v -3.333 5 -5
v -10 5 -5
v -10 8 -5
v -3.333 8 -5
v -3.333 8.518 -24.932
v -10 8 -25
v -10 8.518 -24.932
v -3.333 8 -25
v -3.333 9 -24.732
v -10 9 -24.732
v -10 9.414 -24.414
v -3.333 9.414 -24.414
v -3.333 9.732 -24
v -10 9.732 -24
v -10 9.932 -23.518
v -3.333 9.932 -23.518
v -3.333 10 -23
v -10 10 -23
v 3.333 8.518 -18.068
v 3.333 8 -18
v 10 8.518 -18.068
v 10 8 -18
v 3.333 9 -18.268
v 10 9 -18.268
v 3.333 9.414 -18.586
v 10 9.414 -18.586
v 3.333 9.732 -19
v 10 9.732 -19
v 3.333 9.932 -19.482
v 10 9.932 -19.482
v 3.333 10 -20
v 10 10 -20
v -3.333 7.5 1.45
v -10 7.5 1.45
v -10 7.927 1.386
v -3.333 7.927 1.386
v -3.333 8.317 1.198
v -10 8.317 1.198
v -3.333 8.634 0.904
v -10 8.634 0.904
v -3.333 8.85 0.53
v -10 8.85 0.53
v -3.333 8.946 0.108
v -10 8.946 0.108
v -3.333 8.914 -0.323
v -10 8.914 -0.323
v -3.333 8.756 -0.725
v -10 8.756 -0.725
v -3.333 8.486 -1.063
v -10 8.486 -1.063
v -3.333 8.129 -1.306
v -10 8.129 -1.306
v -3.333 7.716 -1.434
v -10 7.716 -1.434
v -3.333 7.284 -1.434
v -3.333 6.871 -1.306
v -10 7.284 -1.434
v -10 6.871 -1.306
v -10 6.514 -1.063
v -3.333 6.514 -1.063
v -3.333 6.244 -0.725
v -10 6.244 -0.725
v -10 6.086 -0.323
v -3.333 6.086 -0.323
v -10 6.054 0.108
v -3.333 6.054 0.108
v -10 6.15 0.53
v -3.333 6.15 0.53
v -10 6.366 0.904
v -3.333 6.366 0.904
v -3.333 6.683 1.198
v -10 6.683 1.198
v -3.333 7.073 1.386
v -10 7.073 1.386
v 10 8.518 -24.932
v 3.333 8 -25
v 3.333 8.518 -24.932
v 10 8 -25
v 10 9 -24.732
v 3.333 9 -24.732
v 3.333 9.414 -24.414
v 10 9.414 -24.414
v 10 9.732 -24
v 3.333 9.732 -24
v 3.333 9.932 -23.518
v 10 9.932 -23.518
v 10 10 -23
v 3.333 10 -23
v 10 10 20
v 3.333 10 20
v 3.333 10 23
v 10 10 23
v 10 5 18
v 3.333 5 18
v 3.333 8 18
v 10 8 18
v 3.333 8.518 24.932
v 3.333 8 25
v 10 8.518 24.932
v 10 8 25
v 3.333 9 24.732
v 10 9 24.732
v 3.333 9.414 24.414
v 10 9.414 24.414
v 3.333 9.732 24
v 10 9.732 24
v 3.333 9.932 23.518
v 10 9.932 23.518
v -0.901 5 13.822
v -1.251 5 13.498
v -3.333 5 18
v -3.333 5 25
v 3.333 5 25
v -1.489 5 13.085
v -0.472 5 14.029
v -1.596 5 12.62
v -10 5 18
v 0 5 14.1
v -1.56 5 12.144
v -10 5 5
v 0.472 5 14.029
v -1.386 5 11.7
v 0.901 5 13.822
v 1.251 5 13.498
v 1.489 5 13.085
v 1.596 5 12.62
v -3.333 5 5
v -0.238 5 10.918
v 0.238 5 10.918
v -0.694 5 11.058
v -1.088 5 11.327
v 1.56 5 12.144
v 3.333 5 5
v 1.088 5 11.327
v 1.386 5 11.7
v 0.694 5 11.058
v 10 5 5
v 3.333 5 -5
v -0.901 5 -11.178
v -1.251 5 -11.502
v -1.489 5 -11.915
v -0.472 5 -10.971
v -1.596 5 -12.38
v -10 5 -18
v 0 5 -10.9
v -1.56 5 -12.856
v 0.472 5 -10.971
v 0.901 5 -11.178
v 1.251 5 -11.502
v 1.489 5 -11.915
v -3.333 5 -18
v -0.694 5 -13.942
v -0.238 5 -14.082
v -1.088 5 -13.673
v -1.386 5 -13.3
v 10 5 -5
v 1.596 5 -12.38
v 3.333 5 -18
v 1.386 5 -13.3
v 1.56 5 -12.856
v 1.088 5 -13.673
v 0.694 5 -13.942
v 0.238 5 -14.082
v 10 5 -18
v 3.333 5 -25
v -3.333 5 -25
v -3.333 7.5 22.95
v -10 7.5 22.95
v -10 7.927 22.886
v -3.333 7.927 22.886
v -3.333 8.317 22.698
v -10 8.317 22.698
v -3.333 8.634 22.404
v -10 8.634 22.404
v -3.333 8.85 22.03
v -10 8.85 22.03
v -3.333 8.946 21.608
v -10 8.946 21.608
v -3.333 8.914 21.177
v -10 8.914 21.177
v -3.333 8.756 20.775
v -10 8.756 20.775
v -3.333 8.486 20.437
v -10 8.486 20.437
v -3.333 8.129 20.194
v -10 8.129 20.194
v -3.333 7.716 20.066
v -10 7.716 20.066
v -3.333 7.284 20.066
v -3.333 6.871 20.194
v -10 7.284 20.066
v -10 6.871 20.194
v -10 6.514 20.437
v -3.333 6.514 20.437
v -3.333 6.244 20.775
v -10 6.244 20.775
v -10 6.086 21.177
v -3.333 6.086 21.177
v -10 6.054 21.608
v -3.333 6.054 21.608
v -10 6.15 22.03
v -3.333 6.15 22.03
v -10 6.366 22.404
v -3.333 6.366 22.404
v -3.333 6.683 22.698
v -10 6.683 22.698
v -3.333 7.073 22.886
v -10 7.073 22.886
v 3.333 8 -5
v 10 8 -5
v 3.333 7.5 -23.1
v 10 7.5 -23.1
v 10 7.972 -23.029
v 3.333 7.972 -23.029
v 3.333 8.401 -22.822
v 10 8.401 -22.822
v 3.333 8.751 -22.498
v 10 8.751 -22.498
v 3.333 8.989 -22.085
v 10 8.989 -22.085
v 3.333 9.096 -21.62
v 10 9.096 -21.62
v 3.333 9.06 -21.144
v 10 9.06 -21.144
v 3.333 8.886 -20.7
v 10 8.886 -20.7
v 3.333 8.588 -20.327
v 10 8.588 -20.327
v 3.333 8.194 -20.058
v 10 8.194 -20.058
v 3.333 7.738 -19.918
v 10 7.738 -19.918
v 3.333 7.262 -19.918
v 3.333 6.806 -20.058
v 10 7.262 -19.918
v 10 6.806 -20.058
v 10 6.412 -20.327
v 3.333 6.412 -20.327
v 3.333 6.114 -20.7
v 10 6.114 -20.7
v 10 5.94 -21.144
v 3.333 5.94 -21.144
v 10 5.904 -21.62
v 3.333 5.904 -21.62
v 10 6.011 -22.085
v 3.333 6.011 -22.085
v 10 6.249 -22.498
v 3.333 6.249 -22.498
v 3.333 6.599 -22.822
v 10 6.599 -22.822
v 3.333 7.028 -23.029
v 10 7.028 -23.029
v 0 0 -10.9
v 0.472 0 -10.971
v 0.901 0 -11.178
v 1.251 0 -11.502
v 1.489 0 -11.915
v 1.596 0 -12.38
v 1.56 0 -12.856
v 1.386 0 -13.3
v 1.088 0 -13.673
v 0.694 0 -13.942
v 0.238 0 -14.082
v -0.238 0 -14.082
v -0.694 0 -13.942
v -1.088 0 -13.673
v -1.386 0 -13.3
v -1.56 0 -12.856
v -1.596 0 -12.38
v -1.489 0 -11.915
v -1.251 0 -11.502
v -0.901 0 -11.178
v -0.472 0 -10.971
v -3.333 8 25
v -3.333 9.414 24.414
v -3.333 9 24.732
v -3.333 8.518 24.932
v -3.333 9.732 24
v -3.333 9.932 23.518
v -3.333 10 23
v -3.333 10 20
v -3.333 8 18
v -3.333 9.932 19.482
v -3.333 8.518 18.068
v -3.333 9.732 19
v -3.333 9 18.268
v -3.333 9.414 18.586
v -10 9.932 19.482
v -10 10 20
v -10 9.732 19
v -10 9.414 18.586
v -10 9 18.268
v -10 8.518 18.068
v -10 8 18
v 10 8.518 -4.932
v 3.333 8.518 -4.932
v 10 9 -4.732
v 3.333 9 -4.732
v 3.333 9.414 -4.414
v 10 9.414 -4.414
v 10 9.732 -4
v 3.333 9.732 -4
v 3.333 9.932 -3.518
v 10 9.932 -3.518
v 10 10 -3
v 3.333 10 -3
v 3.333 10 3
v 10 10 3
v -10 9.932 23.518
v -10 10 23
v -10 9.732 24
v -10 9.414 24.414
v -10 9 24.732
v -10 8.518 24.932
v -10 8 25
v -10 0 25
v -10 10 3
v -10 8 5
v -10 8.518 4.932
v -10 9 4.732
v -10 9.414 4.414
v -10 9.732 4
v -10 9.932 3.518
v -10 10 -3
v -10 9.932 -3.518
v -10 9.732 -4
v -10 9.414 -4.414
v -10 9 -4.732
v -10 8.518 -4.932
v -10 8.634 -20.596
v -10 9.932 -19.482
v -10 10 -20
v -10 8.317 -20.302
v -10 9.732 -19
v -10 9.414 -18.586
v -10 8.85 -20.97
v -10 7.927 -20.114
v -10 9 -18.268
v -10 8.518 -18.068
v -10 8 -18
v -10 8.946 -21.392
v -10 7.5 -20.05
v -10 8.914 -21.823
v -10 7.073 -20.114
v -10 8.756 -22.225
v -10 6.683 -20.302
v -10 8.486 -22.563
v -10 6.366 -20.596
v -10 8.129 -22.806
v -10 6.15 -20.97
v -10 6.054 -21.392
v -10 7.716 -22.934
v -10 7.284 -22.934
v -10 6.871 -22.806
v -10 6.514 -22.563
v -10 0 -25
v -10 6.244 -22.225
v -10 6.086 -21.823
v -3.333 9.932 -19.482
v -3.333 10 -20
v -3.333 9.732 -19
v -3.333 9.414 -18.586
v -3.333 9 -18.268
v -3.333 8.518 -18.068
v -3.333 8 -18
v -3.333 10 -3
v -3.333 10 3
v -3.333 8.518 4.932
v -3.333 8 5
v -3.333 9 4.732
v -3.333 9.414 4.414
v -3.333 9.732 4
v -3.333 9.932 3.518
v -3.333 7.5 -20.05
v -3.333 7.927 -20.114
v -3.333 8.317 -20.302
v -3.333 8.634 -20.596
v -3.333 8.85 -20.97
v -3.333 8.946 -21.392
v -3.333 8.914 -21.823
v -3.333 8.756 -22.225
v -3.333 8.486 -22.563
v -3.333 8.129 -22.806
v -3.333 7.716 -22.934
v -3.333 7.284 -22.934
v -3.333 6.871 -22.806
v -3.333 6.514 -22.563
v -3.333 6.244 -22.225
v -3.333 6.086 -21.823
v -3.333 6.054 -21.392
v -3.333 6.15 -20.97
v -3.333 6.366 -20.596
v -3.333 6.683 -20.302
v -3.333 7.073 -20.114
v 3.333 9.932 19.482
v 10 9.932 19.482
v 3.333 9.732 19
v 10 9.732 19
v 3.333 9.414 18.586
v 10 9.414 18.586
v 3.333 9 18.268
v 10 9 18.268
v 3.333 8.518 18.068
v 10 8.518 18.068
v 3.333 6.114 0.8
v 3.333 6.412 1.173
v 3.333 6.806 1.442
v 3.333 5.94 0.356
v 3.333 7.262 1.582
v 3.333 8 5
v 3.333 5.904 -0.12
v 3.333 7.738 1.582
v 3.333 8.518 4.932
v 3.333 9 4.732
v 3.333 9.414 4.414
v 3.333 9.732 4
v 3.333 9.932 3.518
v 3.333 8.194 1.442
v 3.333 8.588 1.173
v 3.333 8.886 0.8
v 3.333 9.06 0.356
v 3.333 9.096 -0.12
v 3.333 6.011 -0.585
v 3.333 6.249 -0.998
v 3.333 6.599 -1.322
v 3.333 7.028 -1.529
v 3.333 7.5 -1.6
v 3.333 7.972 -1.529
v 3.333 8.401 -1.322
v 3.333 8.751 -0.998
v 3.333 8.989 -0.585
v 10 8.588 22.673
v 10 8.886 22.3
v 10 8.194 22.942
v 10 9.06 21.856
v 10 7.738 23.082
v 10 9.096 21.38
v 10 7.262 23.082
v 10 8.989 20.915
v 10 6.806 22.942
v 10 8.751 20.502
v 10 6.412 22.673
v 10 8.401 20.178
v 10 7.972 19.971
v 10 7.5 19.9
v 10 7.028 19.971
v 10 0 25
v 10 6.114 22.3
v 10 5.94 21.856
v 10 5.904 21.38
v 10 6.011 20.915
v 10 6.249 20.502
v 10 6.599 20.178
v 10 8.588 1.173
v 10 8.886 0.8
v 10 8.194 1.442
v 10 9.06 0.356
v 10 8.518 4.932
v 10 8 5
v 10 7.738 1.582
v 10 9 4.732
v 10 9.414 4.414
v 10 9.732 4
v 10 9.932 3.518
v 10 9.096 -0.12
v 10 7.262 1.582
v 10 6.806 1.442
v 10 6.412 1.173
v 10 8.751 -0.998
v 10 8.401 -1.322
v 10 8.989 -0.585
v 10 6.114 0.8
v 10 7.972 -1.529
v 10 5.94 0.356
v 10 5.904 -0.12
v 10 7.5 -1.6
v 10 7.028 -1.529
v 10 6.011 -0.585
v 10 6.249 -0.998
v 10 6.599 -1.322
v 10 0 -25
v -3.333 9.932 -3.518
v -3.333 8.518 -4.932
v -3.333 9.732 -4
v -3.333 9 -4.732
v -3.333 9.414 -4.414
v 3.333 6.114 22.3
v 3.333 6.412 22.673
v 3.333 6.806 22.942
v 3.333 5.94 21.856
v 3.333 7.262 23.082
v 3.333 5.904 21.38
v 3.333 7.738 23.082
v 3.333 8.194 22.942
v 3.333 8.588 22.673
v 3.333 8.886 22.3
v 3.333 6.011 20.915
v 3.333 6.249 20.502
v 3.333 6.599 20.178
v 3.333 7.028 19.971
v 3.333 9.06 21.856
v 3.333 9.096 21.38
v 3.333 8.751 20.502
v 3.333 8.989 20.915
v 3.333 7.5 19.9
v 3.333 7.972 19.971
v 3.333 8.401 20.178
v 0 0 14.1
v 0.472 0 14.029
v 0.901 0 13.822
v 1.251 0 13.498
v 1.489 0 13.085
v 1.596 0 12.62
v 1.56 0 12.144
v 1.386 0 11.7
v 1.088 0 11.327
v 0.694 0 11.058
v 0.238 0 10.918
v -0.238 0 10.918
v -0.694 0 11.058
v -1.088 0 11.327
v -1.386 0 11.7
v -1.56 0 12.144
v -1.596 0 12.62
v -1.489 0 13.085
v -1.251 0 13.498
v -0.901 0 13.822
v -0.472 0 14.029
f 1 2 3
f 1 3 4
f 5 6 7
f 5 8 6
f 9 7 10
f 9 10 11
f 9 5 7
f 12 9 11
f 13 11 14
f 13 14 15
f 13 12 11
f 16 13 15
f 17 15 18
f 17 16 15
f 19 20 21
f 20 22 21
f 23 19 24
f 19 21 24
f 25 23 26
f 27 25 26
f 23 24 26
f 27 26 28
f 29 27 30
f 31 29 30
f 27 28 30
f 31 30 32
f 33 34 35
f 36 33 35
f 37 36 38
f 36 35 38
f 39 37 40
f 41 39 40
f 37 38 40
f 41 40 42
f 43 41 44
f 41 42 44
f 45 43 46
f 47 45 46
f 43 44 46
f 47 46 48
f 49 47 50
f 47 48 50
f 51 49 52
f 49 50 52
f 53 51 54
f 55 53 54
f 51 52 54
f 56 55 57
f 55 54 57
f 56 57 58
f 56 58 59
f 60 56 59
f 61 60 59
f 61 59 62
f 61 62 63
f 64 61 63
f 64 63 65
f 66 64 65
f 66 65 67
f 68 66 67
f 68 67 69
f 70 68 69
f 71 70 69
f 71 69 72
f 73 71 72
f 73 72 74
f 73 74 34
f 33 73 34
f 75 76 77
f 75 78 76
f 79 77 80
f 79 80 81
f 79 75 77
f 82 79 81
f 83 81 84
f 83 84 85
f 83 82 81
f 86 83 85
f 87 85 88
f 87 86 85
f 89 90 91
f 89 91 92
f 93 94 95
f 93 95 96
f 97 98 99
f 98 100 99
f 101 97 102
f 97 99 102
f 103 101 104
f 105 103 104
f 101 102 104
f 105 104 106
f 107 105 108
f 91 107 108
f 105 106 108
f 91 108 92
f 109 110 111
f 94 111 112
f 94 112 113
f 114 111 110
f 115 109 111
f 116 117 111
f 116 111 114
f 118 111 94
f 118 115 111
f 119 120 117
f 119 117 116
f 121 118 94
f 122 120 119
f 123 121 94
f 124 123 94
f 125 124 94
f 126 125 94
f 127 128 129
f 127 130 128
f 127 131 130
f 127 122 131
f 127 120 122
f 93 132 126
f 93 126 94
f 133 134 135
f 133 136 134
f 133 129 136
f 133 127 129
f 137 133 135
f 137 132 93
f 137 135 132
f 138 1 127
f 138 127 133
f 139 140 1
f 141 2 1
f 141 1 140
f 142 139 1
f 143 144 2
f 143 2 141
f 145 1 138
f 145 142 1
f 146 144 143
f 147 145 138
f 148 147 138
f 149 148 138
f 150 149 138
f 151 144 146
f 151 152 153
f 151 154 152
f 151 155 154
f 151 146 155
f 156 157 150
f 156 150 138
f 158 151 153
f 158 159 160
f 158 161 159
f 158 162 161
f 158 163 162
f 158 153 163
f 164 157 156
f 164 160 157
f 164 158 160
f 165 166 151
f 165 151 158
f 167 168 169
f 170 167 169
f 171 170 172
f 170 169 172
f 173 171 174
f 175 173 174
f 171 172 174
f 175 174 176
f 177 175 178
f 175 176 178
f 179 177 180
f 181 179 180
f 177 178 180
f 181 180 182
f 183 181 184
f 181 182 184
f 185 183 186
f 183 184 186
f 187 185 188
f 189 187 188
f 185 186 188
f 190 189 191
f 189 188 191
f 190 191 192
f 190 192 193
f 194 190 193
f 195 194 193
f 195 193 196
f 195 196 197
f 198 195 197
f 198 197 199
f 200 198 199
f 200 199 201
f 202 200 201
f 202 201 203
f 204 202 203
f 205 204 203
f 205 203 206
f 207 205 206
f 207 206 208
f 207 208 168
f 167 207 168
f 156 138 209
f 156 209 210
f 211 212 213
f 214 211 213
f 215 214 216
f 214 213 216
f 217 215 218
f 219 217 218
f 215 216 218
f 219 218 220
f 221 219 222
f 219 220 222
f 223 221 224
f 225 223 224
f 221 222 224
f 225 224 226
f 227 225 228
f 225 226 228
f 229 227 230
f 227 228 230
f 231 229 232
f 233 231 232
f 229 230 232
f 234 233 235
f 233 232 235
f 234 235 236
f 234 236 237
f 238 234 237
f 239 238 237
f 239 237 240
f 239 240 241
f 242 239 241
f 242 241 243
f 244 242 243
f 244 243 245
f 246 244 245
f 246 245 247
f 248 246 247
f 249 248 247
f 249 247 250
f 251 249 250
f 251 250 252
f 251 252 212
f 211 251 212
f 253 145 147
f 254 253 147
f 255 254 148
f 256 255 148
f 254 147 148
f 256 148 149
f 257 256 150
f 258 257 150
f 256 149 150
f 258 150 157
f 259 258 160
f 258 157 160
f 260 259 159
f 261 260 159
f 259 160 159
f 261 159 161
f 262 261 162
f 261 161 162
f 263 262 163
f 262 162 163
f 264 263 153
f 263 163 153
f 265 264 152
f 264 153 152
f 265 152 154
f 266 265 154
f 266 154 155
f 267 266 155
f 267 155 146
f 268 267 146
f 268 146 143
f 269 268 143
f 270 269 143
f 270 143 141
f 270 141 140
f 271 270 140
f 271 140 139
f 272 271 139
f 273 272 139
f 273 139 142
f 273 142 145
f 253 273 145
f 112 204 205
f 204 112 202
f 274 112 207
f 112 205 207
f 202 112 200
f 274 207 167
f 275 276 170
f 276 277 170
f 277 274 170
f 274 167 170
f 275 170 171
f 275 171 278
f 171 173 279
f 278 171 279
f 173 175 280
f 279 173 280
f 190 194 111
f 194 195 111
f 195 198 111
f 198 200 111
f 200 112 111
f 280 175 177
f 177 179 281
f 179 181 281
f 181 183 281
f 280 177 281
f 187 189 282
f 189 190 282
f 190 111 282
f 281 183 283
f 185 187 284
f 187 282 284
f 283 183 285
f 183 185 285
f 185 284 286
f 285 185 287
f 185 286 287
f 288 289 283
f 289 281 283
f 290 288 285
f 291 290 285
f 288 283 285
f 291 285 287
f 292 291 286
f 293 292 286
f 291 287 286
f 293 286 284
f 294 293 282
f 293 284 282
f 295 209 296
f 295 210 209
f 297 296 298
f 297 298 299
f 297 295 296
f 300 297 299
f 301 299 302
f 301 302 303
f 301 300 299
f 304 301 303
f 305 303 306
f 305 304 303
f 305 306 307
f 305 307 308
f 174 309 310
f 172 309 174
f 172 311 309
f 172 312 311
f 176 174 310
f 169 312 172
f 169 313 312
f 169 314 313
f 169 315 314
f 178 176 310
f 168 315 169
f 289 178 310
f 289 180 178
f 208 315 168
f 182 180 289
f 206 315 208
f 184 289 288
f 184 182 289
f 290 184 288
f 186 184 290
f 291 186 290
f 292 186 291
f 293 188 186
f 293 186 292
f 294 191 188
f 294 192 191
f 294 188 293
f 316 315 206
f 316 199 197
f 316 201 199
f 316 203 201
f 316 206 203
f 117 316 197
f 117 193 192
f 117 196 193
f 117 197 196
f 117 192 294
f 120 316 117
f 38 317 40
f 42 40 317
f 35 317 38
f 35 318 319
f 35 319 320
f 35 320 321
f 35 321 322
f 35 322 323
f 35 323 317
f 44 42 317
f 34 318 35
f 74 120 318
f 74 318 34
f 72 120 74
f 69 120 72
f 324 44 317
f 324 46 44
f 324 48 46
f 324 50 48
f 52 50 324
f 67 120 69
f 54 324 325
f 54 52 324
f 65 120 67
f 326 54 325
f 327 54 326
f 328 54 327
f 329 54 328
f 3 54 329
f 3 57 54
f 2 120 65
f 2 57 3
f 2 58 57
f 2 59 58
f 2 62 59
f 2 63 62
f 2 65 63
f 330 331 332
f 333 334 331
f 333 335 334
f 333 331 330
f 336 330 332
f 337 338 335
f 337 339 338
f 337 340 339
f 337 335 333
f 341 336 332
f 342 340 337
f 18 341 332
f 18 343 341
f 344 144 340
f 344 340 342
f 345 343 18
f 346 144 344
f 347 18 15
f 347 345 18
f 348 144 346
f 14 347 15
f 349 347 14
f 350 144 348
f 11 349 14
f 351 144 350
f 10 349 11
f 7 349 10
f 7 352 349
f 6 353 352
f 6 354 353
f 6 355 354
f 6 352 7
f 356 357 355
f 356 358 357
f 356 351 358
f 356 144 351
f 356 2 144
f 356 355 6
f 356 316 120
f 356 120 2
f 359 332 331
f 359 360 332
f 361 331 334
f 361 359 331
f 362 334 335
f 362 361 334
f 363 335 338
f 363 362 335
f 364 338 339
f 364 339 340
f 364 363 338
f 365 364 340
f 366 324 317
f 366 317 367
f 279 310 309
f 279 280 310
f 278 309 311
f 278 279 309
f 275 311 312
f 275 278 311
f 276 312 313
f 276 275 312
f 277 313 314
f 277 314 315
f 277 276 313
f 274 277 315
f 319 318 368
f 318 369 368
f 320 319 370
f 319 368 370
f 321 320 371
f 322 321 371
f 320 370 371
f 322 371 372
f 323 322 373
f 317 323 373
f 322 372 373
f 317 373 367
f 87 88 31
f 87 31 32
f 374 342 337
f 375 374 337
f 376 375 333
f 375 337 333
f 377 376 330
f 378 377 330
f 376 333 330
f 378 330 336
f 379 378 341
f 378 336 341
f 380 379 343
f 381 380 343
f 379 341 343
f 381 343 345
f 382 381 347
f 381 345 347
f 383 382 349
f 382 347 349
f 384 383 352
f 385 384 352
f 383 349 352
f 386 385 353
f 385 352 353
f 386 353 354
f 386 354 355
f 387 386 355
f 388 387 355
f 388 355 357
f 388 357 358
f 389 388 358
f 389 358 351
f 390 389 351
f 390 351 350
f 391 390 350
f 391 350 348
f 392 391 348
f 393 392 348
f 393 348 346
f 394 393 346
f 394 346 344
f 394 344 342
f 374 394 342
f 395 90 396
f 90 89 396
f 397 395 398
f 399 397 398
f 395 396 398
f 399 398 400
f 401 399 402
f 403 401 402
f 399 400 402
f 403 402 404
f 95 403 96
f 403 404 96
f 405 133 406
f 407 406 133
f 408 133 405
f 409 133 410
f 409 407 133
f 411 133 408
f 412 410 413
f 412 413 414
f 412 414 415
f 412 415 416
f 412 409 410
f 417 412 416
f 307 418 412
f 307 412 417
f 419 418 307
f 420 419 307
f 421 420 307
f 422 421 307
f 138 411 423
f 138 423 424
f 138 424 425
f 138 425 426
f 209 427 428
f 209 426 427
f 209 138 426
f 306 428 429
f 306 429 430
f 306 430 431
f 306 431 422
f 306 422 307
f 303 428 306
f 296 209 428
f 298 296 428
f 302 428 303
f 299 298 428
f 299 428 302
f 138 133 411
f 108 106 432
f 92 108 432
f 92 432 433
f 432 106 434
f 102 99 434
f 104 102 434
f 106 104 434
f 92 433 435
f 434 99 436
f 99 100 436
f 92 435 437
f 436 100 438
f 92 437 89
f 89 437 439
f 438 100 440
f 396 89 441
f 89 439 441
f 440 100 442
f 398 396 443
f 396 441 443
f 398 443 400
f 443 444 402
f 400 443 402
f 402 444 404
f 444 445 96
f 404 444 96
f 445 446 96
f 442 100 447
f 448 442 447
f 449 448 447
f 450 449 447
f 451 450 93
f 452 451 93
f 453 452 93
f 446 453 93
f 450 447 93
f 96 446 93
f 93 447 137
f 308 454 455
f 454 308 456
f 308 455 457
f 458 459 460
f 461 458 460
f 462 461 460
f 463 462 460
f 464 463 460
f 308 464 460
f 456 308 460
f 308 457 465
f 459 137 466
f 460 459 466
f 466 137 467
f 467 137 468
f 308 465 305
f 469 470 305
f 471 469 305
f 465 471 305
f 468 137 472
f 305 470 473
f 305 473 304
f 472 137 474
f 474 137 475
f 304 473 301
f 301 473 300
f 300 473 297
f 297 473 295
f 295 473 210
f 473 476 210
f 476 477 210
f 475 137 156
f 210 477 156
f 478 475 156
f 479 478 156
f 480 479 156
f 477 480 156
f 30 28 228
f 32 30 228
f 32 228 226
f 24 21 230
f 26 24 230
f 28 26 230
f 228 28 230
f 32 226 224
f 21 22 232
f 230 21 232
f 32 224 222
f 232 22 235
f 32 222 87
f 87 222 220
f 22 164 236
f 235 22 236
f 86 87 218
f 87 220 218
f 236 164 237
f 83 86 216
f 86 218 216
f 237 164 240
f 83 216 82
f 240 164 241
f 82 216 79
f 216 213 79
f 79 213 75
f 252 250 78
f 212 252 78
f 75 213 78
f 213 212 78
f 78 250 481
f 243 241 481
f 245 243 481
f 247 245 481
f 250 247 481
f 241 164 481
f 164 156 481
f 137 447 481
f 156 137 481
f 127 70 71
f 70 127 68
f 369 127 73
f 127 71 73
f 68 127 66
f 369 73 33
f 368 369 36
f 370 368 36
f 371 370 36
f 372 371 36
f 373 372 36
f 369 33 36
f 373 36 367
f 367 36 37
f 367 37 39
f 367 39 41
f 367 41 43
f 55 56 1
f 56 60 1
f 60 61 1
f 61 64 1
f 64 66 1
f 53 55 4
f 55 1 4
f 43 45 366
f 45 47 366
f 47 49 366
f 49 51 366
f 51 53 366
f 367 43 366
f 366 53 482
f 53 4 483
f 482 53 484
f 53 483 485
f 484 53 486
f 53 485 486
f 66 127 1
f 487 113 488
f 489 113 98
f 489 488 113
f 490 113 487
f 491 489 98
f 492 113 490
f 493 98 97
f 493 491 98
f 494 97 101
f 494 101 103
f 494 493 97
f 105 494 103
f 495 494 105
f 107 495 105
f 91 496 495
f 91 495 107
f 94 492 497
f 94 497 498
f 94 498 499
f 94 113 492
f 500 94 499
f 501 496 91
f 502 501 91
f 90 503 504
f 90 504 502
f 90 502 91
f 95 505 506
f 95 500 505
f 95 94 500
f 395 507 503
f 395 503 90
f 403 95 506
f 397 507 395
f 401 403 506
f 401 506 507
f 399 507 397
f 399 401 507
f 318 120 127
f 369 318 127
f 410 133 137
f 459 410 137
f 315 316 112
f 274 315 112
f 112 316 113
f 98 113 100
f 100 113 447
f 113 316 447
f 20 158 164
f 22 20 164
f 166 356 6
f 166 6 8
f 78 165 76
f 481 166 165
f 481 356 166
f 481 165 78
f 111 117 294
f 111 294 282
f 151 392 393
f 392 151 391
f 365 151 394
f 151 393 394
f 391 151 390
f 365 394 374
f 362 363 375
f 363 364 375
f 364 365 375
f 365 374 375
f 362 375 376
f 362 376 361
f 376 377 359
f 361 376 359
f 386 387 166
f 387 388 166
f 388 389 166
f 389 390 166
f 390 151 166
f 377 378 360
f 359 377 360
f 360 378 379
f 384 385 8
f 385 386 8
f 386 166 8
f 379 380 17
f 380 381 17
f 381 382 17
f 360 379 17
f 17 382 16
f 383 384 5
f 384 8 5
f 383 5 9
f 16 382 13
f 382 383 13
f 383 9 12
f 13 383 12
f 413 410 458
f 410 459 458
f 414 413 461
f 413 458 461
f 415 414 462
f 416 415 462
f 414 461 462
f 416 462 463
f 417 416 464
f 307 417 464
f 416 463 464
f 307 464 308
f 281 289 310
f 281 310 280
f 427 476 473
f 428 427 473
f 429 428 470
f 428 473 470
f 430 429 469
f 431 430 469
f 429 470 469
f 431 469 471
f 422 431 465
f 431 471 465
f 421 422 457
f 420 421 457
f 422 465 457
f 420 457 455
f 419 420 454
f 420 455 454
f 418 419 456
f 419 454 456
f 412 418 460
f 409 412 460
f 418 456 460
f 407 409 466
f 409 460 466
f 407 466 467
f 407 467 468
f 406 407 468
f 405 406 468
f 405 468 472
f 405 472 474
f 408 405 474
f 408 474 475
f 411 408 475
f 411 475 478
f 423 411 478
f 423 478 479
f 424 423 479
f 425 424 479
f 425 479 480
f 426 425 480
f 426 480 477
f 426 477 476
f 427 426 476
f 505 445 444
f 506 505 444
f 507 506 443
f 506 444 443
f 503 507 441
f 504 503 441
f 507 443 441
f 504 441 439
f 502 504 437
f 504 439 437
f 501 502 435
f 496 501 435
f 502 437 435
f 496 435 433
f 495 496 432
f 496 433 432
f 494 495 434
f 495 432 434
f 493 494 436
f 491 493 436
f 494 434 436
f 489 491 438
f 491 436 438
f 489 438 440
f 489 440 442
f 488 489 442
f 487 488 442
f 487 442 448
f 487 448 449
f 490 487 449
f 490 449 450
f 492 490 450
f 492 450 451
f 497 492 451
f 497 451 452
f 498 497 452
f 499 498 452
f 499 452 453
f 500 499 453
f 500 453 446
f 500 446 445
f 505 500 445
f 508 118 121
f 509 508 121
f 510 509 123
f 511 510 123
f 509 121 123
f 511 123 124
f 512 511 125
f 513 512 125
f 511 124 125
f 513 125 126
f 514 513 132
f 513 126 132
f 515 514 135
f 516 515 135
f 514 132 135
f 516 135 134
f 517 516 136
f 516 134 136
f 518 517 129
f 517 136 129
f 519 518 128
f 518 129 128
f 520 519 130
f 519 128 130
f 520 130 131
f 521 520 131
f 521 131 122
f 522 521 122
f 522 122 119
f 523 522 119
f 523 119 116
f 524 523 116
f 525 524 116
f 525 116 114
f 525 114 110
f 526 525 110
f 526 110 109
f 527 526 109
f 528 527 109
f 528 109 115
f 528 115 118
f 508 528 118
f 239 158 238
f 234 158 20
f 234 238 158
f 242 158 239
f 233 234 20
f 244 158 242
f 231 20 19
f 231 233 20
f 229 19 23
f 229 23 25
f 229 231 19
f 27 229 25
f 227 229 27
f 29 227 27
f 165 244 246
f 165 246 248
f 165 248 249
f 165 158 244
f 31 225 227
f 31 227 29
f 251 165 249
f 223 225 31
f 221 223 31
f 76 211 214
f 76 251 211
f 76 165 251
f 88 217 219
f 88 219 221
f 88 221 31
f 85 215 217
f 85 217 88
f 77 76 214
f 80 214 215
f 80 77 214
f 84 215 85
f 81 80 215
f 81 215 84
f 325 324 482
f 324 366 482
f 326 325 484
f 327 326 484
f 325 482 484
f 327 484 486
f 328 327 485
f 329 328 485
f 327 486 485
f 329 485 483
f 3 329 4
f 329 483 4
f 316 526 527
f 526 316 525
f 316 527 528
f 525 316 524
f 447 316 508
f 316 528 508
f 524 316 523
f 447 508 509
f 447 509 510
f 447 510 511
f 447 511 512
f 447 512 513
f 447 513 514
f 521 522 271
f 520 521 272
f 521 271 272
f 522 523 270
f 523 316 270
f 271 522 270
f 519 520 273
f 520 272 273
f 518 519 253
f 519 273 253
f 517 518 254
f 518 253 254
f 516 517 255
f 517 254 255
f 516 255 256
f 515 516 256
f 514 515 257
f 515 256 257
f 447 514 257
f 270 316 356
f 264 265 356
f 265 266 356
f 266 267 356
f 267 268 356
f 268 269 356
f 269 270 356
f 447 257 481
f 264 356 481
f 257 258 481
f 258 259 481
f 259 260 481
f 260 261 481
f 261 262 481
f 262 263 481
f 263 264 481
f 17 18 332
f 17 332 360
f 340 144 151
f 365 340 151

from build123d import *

# Parameters (mm, degrees)
SKETCH1_W           = 20
SKETCH1_H           = 50
BOSS_EXTRUDE1_DEPTH = 5
SKETCH2_R           = 1.6
CUT_EXTRUDE1_DEPTH  = 28.386127875
SKETCH3_W           = 20
SKETCH3_H           = 10
SKETCH3_H_2         = 7
BOSS_EXTRUDE2_DEPTH = 5
SKETCH4_R           = 1.45
CUT_EXTRUDE2_DEPTH  = 34.541019662
SKETCH5_W           = 6.666666666
SKETCH5_H           = 5
CUT_EXTRUDE3_DEPTH  = 52.961524227
CUT_EXTRUDE4_REACH  = 35.541
SKETCH6_R           = 1.6
FILLET1_R           = 2


with BuildPart() as part:
    # Sketch1 → Boss-Extrude1 (new body)
    with BuildSketch(Plane(origin=(0, 0, 0), x_dir=(1, 0, 0), z_dir=(0, 1, 0))):
        Rectangle(SKETCH1_W, SKETCH1_H)
    extrude(amount=BOSS_EXTRUDE1_DEPTH)

    # Sketch2 → Cut-Extrude1 (cut, through all)
    with BuildSketch(Plane(origin=(0, 5, 0), x_dir=(1, 0, 0), z_dir=(0, 1, 0))):
        with Locations(Location((0, 12.5, 0), (0, 0, 270))):
            Circle(SKETCH2_R)
        with Locations(Location((0, -12.5, 0), (0, 0, 270))):
            Circle(SKETCH2_R)
    extrude(amount=-CUT_EXTRUDE1_DEPTH, mode=Mode.SUBTRACT)

    # Sketch3 → Boss-Extrude2 (add)
    with BuildSketch(Plane(origin=(0, 5, 0), x_dir=(1, 0, 0), z_dir=(0, 1, 0))):
        Rectangle(SKETCH3_W, SKETCH3_H)
        with Locations((0, -21.5)):
            Rectangle(SKETCH3_W, SKETCH3_H_2)
        with Locations((0, 21.5)):
            Rectangle(SKETCH3_W, SKETCH3_H_2)
    extrude(amount=BOSS_EXTRUDE2_DEPTH)

    # Sketch4 → Cut-Extrude2 (cut, through all)
    with BuildSketch(Plane.ZY.offset(10)):
        with Locations((-21.5, 7.5)):
            Circle(SKETCH4_R)
        with Locations((0, 7.5)):
            Circle(SKETCH4_R)
        with Locations((21.5, 7.5)):
            Circle(SKETCH4_R)
    extrude(amount=-CUT_EXTRUDE2_DEPTH, mode=Mode.SUBTRACT)

    # Sketch5 → Cut-Extrude3 (cut, through all)
    with BuildSketch(Plane(origin=(0, 0, -25), x_dir=(-1, 0, 0), z_dir=(0, 0, -1))):
        with Locations((0, 7.5)):
            Rectangle(SKETCH5_W, SKETCH5_H)
    extrude(amount=-CUT_EXTRUDE3_DEPTH, mode=Mode.SUBTRACT)

    # Sketch6 → Cut-Extrude4 (cut, up to next)
    with BuildSketch(Plane(origin=(10, 0, 0), x_dir=(0, 0, -1), z_dir=(1, 0, 0)), mode=Mode.PRIVATE) as cut_extrude4_sk1:
        with Locations((21.5, 7.5)):
            Circle(SKETCH6_R)
    cut_extrude4_tool1 = extrude(cut_extrude4_sk1.sketch, amount=-CUT_EXTRUDE4_REACH, mode=Mode.PRIVATE) & part.part
    # Sketch6 → Cut-Extrude4 (cut, up to next)
    with BuildSketch(Plane(origin=(10, 0, 0), x_dir=(0, 0, -1), z_dir=(1, 0, 0)), mode=Mode.PRIVATE) as cut_extrude4_sk2:
        with Locations((0, 7.5)):
            Circle(SKETCH6_R)
    cut_extrude4_tool2 = extrude(cut_extrude4_sk2.sketch, amount=-CUT_EXTRUDE4_REACH, mode=Mode.PRIVATE) & part.part
    # Sketch6 → Cut-Extrude4 (cut, up to next)
    with BuildSketch(Plane(origin=(10, 0, 0), x_dir=(0, 0, -1), z_dir=(1, 0, 0)), mode=Mode.PRIVATE) as cut_extrude4_sk3:
        with Locations((-21.5, 7.5)):
            Circle(SKETCH6_R)
    cut_extrude4_tool3 = extrude(cut_extrude4_sk3.sketch, amount=-CUT_EXTRUDE4_REACH, mode=Mode.PRIVATE) & part.part
    add(cut_extrude4_tool1.solids().sort_by_distance((10, 7.5, -21.5))[0], mode=Mode.SUBTRACT)
    add(cut_extrude4_tool2.solids().sort_by_distance((10, 7.5, 0))[0], mode=Mode.SUBTRACT)
    add(cut_extrude4_tool3.solids().sort_by_distance((10, 7.5, 21.5))[0], mode=Mode.SUBTRACT)

    # Fillet1
    fillet1_edges = [part.edges().sort_by_distance(p)[0] for p in [
        (6.666666667, 10, -25),
        (-6.666666667, 10, -18),
        (6.666666667, 10, 18),
        (-6.666666667, 10, 25),
        (6.666666667, 10, -5),
        (-6.666666667, 10, 5),
        (-6.666666667, 10, -25),
        (6.666666667, 10, -18),
        (-6.666666667, 10, 18),
        (6.666666667, 10, 25),
        (-6.666666667, 10, -5),
        (6.666666667, 10, 5),
    ]]
    fillet(fillet1_edges, radius=FILLET1_R)


solid = part.part
